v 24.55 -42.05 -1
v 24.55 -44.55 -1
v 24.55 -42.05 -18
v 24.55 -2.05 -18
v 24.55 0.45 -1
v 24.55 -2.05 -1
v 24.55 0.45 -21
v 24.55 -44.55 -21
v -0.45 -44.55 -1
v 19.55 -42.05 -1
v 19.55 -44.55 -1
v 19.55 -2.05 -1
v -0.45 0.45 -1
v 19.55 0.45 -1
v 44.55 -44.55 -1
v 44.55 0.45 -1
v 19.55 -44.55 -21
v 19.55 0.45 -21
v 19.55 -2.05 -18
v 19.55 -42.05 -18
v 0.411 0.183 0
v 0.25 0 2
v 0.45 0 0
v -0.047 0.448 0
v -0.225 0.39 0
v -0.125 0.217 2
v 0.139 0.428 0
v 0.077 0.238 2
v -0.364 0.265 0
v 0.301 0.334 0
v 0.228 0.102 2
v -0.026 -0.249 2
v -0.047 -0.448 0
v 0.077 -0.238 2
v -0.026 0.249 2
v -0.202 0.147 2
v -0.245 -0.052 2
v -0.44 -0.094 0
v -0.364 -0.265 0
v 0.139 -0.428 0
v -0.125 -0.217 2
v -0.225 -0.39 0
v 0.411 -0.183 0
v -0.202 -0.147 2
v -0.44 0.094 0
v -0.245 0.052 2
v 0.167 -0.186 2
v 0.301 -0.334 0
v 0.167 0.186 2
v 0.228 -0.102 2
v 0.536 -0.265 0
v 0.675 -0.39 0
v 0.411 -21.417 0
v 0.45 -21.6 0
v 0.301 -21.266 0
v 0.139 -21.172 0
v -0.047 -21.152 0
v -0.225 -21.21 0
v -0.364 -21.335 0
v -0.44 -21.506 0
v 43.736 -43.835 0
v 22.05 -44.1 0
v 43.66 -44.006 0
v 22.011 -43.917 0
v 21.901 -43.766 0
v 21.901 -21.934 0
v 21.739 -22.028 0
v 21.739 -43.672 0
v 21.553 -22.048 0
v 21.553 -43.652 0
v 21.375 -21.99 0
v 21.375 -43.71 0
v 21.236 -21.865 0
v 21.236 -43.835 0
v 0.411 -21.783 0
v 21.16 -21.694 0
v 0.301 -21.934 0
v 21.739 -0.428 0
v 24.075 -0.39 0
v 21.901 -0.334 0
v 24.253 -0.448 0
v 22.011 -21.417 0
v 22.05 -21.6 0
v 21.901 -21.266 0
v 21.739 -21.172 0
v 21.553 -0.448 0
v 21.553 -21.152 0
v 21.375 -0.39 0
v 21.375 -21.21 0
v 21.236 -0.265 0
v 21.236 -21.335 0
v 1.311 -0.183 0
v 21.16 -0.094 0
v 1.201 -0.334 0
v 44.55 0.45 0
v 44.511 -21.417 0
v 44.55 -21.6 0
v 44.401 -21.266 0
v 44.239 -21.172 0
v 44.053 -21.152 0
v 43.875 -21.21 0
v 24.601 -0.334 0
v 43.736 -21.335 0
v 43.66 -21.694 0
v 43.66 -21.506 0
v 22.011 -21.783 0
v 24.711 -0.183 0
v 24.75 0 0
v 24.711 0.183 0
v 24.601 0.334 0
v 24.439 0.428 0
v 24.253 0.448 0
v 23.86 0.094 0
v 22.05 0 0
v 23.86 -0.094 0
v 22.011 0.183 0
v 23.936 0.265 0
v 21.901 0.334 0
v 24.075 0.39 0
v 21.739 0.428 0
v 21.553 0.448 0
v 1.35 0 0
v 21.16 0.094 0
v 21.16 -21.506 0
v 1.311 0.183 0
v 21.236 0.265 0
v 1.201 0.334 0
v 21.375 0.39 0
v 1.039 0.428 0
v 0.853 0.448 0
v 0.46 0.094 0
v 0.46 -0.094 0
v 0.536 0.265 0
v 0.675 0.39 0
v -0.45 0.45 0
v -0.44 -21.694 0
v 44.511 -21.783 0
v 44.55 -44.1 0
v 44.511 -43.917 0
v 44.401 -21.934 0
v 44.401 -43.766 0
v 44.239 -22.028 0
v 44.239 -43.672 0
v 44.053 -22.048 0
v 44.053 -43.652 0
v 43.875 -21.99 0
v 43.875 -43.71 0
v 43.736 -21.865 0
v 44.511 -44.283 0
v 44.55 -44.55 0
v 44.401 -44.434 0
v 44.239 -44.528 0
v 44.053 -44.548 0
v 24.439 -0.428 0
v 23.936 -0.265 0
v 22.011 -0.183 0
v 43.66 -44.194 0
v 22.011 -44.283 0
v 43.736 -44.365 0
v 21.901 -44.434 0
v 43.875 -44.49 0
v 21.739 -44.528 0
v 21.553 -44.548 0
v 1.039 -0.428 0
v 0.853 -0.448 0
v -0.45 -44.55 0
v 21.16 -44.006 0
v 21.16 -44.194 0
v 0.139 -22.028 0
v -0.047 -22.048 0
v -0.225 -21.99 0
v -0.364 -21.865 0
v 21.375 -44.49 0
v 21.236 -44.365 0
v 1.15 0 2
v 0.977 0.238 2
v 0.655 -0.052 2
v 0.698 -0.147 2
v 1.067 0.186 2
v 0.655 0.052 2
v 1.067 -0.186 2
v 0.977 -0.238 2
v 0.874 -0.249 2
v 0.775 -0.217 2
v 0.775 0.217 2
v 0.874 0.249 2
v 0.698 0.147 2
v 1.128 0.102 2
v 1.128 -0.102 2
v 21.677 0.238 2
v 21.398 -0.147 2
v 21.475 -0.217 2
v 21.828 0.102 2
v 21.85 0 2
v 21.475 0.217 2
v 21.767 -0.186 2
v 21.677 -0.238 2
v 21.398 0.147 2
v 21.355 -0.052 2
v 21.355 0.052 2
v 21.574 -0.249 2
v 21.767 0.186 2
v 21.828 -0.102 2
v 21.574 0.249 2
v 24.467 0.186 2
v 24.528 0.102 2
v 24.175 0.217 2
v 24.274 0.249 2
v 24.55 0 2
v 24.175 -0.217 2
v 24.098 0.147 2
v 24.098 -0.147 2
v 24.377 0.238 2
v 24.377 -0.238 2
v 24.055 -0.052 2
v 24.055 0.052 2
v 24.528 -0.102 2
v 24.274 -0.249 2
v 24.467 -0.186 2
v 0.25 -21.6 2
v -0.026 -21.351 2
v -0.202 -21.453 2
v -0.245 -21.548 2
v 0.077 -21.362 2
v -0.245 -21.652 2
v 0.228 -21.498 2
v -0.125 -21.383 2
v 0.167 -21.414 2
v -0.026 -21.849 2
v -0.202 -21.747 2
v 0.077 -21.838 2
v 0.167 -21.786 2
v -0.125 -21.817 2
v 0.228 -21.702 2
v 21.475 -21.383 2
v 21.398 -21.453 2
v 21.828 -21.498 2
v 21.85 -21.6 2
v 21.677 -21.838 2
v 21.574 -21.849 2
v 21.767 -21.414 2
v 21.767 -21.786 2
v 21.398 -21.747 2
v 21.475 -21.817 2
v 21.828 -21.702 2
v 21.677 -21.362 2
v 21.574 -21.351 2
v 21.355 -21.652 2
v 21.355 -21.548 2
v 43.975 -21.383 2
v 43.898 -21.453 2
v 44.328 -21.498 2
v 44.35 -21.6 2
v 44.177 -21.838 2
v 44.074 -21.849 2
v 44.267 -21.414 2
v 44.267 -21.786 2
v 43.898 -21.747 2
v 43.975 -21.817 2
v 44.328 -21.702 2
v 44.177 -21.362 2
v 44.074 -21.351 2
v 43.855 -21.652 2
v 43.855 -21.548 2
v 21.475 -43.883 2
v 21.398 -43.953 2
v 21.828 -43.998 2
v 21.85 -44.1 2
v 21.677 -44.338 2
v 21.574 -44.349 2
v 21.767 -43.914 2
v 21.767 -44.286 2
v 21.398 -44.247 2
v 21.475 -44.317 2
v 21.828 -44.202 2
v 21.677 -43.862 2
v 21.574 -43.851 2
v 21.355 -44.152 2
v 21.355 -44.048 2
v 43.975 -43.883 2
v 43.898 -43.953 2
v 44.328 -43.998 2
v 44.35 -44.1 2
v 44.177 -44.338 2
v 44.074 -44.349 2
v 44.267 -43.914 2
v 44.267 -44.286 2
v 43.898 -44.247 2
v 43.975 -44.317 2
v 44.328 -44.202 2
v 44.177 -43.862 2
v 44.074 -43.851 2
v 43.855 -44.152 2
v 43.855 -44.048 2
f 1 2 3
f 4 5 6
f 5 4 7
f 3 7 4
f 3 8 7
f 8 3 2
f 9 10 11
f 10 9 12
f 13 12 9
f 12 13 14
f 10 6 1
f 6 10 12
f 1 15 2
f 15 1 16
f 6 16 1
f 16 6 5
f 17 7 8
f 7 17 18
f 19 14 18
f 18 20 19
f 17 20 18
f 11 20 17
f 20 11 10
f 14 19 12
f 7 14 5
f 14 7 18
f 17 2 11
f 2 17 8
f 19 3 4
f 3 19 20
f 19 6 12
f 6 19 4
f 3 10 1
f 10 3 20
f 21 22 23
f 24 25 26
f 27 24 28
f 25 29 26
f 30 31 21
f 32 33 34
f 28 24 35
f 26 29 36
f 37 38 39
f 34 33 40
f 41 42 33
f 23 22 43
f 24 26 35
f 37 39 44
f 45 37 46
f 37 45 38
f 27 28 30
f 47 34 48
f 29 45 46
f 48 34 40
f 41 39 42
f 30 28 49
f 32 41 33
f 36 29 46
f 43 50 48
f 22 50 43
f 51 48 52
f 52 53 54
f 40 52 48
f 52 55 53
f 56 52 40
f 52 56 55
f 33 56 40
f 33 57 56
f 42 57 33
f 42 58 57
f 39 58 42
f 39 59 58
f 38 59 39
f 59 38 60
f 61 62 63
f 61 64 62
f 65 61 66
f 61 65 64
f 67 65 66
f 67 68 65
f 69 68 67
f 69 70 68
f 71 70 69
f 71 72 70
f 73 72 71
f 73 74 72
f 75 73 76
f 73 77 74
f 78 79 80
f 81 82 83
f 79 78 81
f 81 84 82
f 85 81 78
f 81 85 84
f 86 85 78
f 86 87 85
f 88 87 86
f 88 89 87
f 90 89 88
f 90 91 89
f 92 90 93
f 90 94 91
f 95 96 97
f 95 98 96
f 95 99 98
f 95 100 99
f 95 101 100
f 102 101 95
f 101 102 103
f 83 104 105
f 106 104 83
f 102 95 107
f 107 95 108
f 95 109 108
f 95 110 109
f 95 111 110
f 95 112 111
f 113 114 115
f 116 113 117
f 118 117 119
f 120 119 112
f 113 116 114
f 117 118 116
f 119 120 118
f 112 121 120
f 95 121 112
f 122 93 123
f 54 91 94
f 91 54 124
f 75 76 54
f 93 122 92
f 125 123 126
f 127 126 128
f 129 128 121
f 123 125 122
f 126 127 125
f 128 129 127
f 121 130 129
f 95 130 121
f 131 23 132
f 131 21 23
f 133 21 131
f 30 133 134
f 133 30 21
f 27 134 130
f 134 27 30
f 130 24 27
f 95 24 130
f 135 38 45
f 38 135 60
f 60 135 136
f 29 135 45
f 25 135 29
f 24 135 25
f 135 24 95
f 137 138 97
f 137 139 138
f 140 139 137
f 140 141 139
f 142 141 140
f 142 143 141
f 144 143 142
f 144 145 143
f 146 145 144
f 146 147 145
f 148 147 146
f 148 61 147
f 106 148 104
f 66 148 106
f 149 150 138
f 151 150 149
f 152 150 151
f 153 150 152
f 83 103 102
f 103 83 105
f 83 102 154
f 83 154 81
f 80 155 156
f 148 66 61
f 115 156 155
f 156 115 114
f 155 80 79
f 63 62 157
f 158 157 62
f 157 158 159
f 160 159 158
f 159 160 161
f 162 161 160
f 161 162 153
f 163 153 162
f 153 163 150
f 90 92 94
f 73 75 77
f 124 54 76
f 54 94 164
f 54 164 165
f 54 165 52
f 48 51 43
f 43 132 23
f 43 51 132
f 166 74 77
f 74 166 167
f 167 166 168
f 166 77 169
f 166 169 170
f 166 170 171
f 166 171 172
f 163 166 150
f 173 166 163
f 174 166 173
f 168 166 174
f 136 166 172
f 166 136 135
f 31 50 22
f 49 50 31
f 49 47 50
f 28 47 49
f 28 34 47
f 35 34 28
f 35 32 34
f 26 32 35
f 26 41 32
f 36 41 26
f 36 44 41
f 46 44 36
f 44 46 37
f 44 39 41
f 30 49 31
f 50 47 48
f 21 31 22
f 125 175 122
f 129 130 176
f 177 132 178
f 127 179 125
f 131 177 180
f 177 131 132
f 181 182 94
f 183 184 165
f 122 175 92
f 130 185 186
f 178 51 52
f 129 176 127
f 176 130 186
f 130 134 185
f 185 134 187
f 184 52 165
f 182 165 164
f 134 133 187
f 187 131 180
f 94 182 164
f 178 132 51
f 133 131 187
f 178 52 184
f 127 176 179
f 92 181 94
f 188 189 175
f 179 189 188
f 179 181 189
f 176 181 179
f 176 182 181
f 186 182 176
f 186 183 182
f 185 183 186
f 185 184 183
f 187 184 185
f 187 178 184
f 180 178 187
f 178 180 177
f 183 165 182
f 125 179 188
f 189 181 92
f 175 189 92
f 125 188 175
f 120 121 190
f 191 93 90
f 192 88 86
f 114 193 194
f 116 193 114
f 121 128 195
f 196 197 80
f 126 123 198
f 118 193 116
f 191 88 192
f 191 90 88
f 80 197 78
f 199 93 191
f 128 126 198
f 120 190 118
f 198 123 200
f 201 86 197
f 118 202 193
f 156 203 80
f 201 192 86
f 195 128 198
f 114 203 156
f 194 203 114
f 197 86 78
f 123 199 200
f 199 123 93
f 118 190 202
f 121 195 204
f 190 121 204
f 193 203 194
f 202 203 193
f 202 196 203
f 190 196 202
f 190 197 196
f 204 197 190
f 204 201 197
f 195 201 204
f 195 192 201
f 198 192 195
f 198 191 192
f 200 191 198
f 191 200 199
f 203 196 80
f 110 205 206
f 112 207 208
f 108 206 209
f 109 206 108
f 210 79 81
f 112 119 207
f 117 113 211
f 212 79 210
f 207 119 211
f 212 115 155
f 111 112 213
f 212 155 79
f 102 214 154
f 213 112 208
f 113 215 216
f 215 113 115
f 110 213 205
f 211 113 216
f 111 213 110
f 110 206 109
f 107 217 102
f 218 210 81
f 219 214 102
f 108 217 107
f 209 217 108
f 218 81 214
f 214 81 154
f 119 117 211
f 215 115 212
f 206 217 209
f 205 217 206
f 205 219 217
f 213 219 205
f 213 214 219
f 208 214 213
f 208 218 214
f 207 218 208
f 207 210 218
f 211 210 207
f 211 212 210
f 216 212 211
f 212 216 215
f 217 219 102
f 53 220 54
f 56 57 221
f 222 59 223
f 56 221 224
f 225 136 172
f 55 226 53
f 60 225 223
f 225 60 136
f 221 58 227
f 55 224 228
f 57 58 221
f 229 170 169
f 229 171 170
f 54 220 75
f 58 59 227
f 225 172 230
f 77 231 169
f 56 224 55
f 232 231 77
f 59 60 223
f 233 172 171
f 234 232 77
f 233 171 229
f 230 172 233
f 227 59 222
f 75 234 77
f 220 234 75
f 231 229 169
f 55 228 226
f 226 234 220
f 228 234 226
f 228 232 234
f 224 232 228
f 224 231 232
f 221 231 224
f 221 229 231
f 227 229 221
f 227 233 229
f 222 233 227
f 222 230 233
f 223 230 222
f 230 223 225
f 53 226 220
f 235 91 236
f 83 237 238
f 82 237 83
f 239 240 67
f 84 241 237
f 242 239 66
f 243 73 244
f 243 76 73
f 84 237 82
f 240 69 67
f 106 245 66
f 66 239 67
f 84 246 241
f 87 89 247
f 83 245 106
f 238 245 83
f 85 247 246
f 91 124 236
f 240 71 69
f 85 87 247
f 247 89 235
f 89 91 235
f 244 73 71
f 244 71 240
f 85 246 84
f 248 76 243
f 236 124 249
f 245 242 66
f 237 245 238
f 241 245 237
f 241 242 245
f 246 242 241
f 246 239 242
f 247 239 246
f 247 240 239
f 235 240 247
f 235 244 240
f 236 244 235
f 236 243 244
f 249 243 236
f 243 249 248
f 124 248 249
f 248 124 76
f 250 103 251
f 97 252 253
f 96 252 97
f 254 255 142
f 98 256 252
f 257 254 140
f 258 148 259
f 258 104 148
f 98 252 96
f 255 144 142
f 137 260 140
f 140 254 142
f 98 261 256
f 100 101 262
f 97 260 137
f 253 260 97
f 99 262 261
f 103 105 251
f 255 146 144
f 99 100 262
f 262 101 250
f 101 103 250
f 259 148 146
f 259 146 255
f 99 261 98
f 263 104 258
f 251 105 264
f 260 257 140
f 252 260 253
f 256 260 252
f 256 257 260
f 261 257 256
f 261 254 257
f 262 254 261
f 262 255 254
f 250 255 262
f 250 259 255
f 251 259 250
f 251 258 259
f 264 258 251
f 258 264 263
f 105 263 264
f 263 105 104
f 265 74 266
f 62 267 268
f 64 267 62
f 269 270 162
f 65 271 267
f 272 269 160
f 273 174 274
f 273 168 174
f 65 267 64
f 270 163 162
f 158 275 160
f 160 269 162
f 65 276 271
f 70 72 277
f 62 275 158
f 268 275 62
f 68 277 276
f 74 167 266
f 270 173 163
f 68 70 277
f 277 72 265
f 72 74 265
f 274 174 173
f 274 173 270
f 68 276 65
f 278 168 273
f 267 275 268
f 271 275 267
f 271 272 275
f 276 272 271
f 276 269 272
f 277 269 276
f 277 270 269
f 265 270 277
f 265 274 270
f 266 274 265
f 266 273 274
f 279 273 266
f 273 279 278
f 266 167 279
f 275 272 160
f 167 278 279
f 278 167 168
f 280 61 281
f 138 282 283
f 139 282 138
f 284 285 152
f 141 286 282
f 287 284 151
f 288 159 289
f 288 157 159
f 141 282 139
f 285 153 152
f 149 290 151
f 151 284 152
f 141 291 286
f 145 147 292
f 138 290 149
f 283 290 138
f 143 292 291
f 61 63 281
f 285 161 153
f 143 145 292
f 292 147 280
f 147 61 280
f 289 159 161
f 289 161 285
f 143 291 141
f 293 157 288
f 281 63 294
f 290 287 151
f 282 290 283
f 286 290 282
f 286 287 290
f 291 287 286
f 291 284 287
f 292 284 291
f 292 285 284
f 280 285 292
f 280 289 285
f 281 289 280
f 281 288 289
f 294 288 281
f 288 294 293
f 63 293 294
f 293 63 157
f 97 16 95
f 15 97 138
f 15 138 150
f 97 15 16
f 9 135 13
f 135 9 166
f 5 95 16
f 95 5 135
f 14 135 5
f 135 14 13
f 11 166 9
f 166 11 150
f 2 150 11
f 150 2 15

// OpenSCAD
$fn=15;
gridLength = 45;
gridSquares = 50;
oneGridLength = gridLength / gridSquares;
platformThickness = 1;
handleThickness = 5;
handleHeight = 20;

module buildPlatform(){
  translate([22.05,-22.05, -0.5 * platformThickness])
  cube([45,45,platformThickness], center = true);  
    
}

module buildHandle(){
    translate([22.05,-22.05,-0.5 * handleHeight - platformThickness])
    difference(){
        cube([handleThickness, 45, handleHeight], center = true);
        translate([0,0,4])
        cube([handleThickness + 1, 40, 22], center = true);
    }
    
}   

module buildStamp(array){
  buildPlatform();
  buildHandle();
  
  for ( row=[0:1:gridSquares - 1]) {
    for ( col=[0:1:gridSquares - 1]) {
      if(array[row][col] == 1){
        translate([col * oneGridLength,row * -1 * oneGridLength,0])
        cylinder(h=2,d1=oneGridLength, d2 = 0.5);
      }   
    }
  }
  
    
}

buildStamp(sender_array);

sender_array = [[1, 1, 0, 0, 0, 0, 0, 0, 0, 0, 0, 0, 0, 0, 0, 0, 0, 0, 0, 0, 0, 0, 0, 0, 1, 0, 0, 1, 0, 0, 0, 0, 0, 0, 0, 0, 0, 0, 0, 0, 0, 0, 0, 0, 0, 0, 0, 0, 0, 0], [0, 0, 0, 0, 0, 0, 0, 0, 0, 0, 0, 0, 0, 0, 0, 0, 0, 0, 0, 0, 0, 0, 0, 0, 0, 0, 0, 0, 0, 0, 0, 0, 0, 0, 0, 0, 0, 0, 0, 0, 0, 0, 0, 0, 0, 0, 0, 0, 0, 0], [0, 0, 0, 0, 0, 0, 0, 0, 0, 0, 0, 0, 0, 0, 0, 0, 0, 0, 0, 0, 0, 0, 0, 0, 0, 0, 0, 0, 0, 0, 0, 0, 0, 0, 0, 0, 0, 0, 0, 0, 0, 0, 0, 0, 0, 0, 0, 0, 0, 0], [0, 0, 0, 0, 0, 0, 0, 0, 0, 0, 0, 0, 0, 0, 0, 0, 0, 0, 0, 0, 0, 0, 0, 0, 0, 0, 0, 0, 0, 0, 0, 0, 0, 0, 0, 0, 0, 0, 0, 0, 0, 0, 0, 0, 0, 0, 0, 0, 0, 0], [0, 0, 0, 0, 0, 0, 0, 0, 0, 0, 0, 0, 0, 0, 0, 0, 0, 0, 0, 0, 0, 0, 0, 0, 0, 0, 0, 0, 0, 0, 0, 0, 0, 0, 0, 0, 0, 0, 0, 0, 0, 0, 0, 0, 0, 0, 0, 0, 0, 0], [0, 0, 0, 0, 0, 0, 0, 0, 0, 0, 0, 0, 0, 0, 0, 0, 0, 0, 0, 0, 0, 0, 0, 0, 0, 0, 0, 0, 0, 0, 0, 0, 0, 0, 0, 0, 0, 0, 0, 0, 0, 0, 0, 0, 0, 0, 0, 0, 0, 0], [0, 0, 0, 0, 0, 0, 0, 0, 0, 0, 0, 0, 0, 0, 0, 0, 0, 0, 0, 0, 0, 0, 0, 0, 0, 0, 0, 0, 0, 0, 0, 0, 0, 0, 0, 0, 0, 0, 0, 0, 0, 0, 0, 0, 0, 0, 0, 0, 0, 0], [0, 0, 0, 0, 0, 0, 0, 0, 0, 0, 0, 0, 0, 0, 0, 0, 0, 0, 0, 0, 0, 0, 0, 0, 0, 0, 0, 0, 0, 0, 0, 0, 0, 0, 0, 0, 0, 0, 0, 0, 0, 0, 0, 0, 0, 0, 0, 0, 0, 0], [0, 0, 0, 0, 0, 0, 0, 0, 0, 0, 0, 0, 0, 0, 0, 0, 0, 0, 0, 0, 0, 0, 0, 0, 0, 0, 0, 0, 0, 0, 0, 0, 0, 0, 0, 0, 0, 0, 0, 0, 0, 0, 0, 0, 0, 0, 0, 0, 0, 0], [0, 0, 0, 0, 0, 0, 0, 0, 0, 0, 0, 0, 0, 0, 0, 0, 0, 0, 0, 0, 0, 0, 0, 0, 0, 0, 0, 0, 0, 0, 0, 0, 0, 0, 0, 0, 0, 0, 0, 0, 0, 0, 0, 0, 0, 0, 0, 0, 0, 0], [0, 0, 0, 0, 0, 0, 0, 0, 0, 0, 0, 0, 0, 0, 0, 0, 0, 0, 0, 0, 0, 0, 0, 0, 0, 0, 0, 0, 0, 0, 0, 0, 0, 0, 0, 0, 0, 0, 0, 0, 0, 0, 0, 0, 0, 0, 0, 0, 0, 0], [0, 0, 0, 0, 0, 0, 0, 0, 0, 0, 0, 0, 0, 0, 0, 0, 0, 0, 0, 0, 0, 0, 0, 0, 0, 0, 0, 0, 0, 0, 0, 0, 0, 0, 0, 0, 0, 0, 0, 0, 0, 0, 0, 0, 0, 0, 0, 0, 0, 0], [0, 0, 0, 0, 0, 0, 0, 0, 0, 0, 0, 0, 0, 0, 0, 0, 0, 0, 0, 0, 0, 0, 0, 0, 0, 0, 0, 0, 0, 0, 0, 0, 0, 0, 0, 0, 0, 0, 0, 0, 0, 0, 0, 0, 0, 0, 0, 0, 0, 0], [0, 0, 0, 0, 0, 0, 0, 0, 0, 0, 0, 0, 0, 0, 0, 0, 0, 0, 0, 0, 0, 0, 0, 0, 0, 0, 0, 0, 0, 0, 0, 0, 0, 0, 0, 0, 0, 0, 0, 0, 0, 0, 0, 0, 0, 0, 0, 0, 0, 0], [0, 0, 0, 0, 0, 0, 0, 0, 0, 0, 0, 0, 0, 0, 0, 0, 0, 0, 0, 0, 0, 0, 0, 0, 0, 0, 0, 0, 0, 0, 0, 0, 0, 0, 0, 0, 0, 0, 0, 0, 0, 0, 0, 0, 0, 0, 0, 0, 0, 0], [0, 0, 0, 0, 0, 0, 0, 0, 0, 0, 0, 0, 0, 0, 0, 0, 0, 0, 0, 0, 0, 0, 0, 0, 0, 0, 0, 0, 0, 0, 0, 0, 0, 0, 0, 0, 0, 0, 0, 0, 0, 0, 0, 0, 0, 0, 0, 0, 0, 0], [0, 0, 0, 0, 0, 0, 0, 0, 0, 0, 0, 0, 0, 0, 0, 0, 0, 0, 0, 0, 0, 0, 0, 0, 0, 0, 0, 0, 0, 0, 0, 0, 0, 0, 0, 0, 0, 0, 0, 0, 0, 0, 0, 0, 0, 0, 0, 0, 0, 0], [0, 0, 0, 0, 0, 0, 0, 0, 0, 0, 0, 0, 0, 0, 0, 0, 0, 0, 0, 0, 0, 0, 0, 0, 0, 0, 0, 0, 0, 0, 0, 0, 0, 0, 0, 0, 0, 0, 0, 0, 0, 0, 0, 0, 0, 0, 0, 0, 0, 0], [0, 0, 0, 0, 0, 0, 0, 0, 0, 0, 0, 0, 0, 0, 0, 0, 0, 0, 0, 0, 0, 0, 0, 0, 0, 0, 0, 0, 0, 0, 0, 0, 0, 0, 0, 0, 0, 0, 0, 0, 0, 0, 0, 0, 0, 0, 0, 0, 0, 0], [0, 0, 0, 0, 0, 0, 0, 0, 0, 0, 0, 0, 0, 0, 0, 0, 0, 0, 0, 0, 0, 0, 0, 0, 0, 0, 0, 0, 0, 0, 0, 0, 0, 0, 0, 0, 0, 0, 0, 0, 0, 0, 0, 0, 0, 0, 0, 0, 0, 0], [0, 0, 0, 0, 0, 0, 0, 0, 0, 0, 0, 0, 0, 0, 0, 0, 0, 0, 0, 0, 0, 0, 0, 0, 0, 0, 0, 0, 0, 0, 0, 0, 0, 0, 0, 0, 0, 0, 0, 0, 0, 0, 0, 0, 0, 0, 0, 0, 0, 0], [0, 0, 0, 0, 0, 0, 0, 0, 0, 0, 0, 0, 0, 0, 0, 0, 0, 0, 0, 0, 0, 0, 0, 0, 0, 0, 0, 0, 0, 0, 0, 0, 0, 0, 0, 0, 0, 0, 0, 0, 0, 0, 0, 0, 0, 0, 0, 0, 0, 0], [0, 0, 0, 0, 0, 0, 0, 0, 0, 0, 0, 0, 0, 0, 0, 0, 0, 0, 0, 0, 0, 0, 0, 0, 0, 0, 0, 0, 0, 0, 0, 0, 0, 0, 0, 0, 0, 0, 0, 0, 0, 0, 0, 0, 0, 0, 0, 0, 0, 0], [0, 0, 0, 0, 0, 0, 0, 0, 0, 0, 0, 0, 0, 0, 0, 0, 0, 0, 0, 0, 0, 0, 0, 0, 0, 0, 0, 0, 0, 0, 0, 0, 0, 0, 0, 0, 0, 0, 0, 0, 0, 0, 0, 0, 0, 0, 0, 0, 0, 0], [1, 0, 0, 0, 0, 0, 0, 0, 0, 0, 0, 0, 0, 0, 0, 0, 0, 0, 0, 0, 0, 0, 0, 0, 1, 0, 0, 0, 0, 0, 0, 0, 0, 0, 0, 0, 0, 0, 0, 0, 0, 0, 0, 0, 0, 0, 0, 0, 0, 1], [0, 0, 0, 0, 0, 0, 0, 0, 0, 0, 0, 0, 0, 0, 0, 0, 0, 0, 0, 0, 0, 0, 0, 0, 0, 0, 0, 0, 0, 0, 0, 0, 0, 0, 0, 0, 0, 0, 0, 0, 0, 0, 0, 0, 0, 0, 0, 0, 0, 0], [0, 0, 0, 0, 0, 0, 0, 0, 0, 0, 0, 0, 0, 0, 0, 0, 0, 0, 0, 0, 0, 0, 0, 0, 0, 0, 0, 0, 0, 0, 0, 0, 0, 0, 0, 0, 0, 0, 0, 0, 0, 0, 0, 0, 0, 0, 0, 0, 0, 0], [0, 0, 0, 0, 0, 0, 0, 0, 0, 0, 0, 0, 0, 0, 0, 0, 0, 0, 0, 0, 0, 0, 0, 0, 0, 0, 0, 0, 0, 0, 0, 0, 0, 0, 0, 0, 0, 0, 0, 0, 0, 0, 0, 0, 0, 0, 0, 0, 0, 0], [0, 0, 0, 0, 0, 0, 0, 0, 0, 0, 0, 0, 0, 0, 0, 0, 0, 0, 0, 0, 0, 0, 0, 0, 0, 0, 0, 0, 0, 0, 0, 0, 0, 0, 0, 0, 0, 0, 0, 0, 0, 0, 0, 0, 0, 0, 0, 0, 0, 0], [0, 0, 0, 0, 0, 0, 0, 0, 0, 0, 0, 0, 0, 0, 0, 0, 0, 0, 0, 0, 0, 0, 0, 0, 0, 0, 0, 0, 0, 0, 0, 0, 0, 0, 0, 0, 0, 0, 0, 0, 0, 0, 0, 0, 0, 0, 0, 0, 0, 0], [0, 0, 0, 0, 0, 0, 0, 0, 0, 0, 0, 0, 0, 0, 0, 0, 0, 0, 0, 0, 0, 0, 0, 0, 0, 0, 0, 0, 0, 0, 0, 0, 0, 0, 0, 0, 0, 0, 0, 0, 0, 0, 0, 0, 0, 0, 0, 0, 0, 0], [0, 0, 0, 0, 0, 0, 0, 0, 0, 0, 0, 0, 0, 0, 0, 0, 0, 0, 0, 0, 0, 0, 0, 0, 0, 0, 0, 0, 0, 0, 0, 0, 0, 0, 0, 0, 0, 0, 0, 0, 0, 0, 0, 0, 0, 0, 0, 0, 0, 0], [0, 0, 0, 0, 0, 0, 0, 0, 0, 0, 0, 0, 0, 0, 0, 0, 0, 0, 0, 0, 0, 0, 0, 0, 0, 0, 0, 0, 0, 0, 0, 0, 0, 0, 0, 0, 0, 0, 0, 0, 0, 0, 0, 0, 0, 0, 0, 0, 0, 0], [0, 0, 0, 0, 0, 0, 0, 0, 0, 0, 0, 0, 0, 0, 0, 0, 0, 0, 0, 0, 0, 0, 0, 0, 0, 0, 0, 0, 0, 0, 0, 0, 0, 0, 0, 0, 0, 0, 0, 0, 0, 0, 0, 0, 0, 0, 0, 0, 0, 0], [0, 0, 0, 0, 0, 0, 0, 0, 0, 0, 0, 0, 0, 0, 0, 0, 0, 0, 0, 0, 0, 0, 0, 0, 0, 0, 0, 0, 0, 0, 0, 0, 0, 0, 0, 0, 0, 0, 0, 0, 0, 0, 0, 0, 0, 0, 0, 0, 0, 0], [0, 0, 0, 0, 0, 0, 0, 0, 0, 0, 0, 0, 0, 0, 0, 0, 0, 0, 0, 0, 0, 0, 0, 0, 0, 0, 0, 0, 0, 0, 0, 0, 0, 0, 0, 0, 0, 0, 0, 0, 0, 0, 0, 0, 0, 0, 0, 0, 0, 0], [0, 0, 0, 0, 0, 0, 0, 0, 0, 0, 0, 0, 0, 0, 0, 0, 0, 0, 0, 0, 0, 0, 0, 0, 0, 0, 0, 0, 0, 0, 0, 0, 0, 0, 0, 0, 0, 0, 0, 0, 0, 0, 0, 0, 0, 0, 0, 0, 0, 0], [0, 0, 0, 0, 0, 0, 0, 0, 0, 0, 0, 0, 0, 0, 0, 0, 0, 0, 0, 0, 0, 0, 0, 0, 0, 0, 0, 0, 0, 0, 0, 0, 0, 0, 0, 0, 0, 0, 0, 0, 0, 0, 0, 0, 0, 0, 0, 0, 0, 0], [0, 0, 0, 0, 0, 0, 0, 0, 0, 0, 0, 0, 0, 0, 0, 0, 0, 0, 0, 0, 0, 0, 0, 0, 0, 0, 0, 0, 0, 0, 0, 0, 0, 0, 0, 0, 0, 0, 0, 0, 0, 0, 0, 0, 0, 0, 0, 0, 0, 0], [0, 0, 0, 0, 0, 0, 0, 0, 0, 0, 0, 0, 0, 0, 0, 0, 0, 0, 0, 0, 0, 0, 0, 0, 0, 0, 0, 0, 0, 0, 0, 0, 0, 0, 0, 0, 0, 0, 0, 0, 0, 0, 0, 0, 0, 0, 0, 0, 0, 0], [0, 0, 0, 0, 0, 0, 0, 0, 0, 0, 0, 0, 0, 0, 0, 0, 0, 0, 0, 0, 0, 0, 0, 0, 0, 0, 0, 0, 0, 0, 0, 0, 0, 0, 0, 0, 0, 0, 0, 0, 0, 0, 0, 0, 0, 0, 0, 0, 0, 0], [0, 0, 0, 0, 0, 0, 0, 0, 0, 0, 0, 0, 0, 0, 0, 0, 0, 0, 0, 0, 0, 0, 0, 0, 0, 0, 0, 0, 0, 0, 0, 0, 0, 0, 0, 0, 0, 0, 0, 0, 0, 0, 0, 0, 0, 0, 0, 0, 0, 0], [0, 0, 0, 0, 0, 0, 0, 0, 0, 0, 0, 0, 0, 0, 0, 0, 0, 0, 0, 0, 0, 0, 0, 0, 0, 0, 0, 0, 0, 0, 0, 0, 0, 0, 0, 0, 0, 0, 0, 0, 0, 0, 0, 0, 0, 0, 0, 0, 0, 0], [0, 0, 0, 0, 0, 0, 0, 0, 0, 0, 0, 0, 0, 0, 0, 0, 0, 0, 0, 0, 0, 0, 0, 0, 0, 0, 0, 0, 0, 0, 0, 0, 0, 0, 0, 0, 0, 0, 0, 0, 0, 0, 0, 0, 0, 0, 0, 0, 0, 0], [0, 0, 0, 0, 0, 0, 0, 0, 0, 0, 0, 0, 0, 0, 0, 0, 0, 0, 0, 0, 0, 0, 0, 0, 0, 0, 0, 0, 0, 0, 0, 0, 0, 0, 0, 0, 0, 0, 0, 0, 0, 0, 0, 0, 0, 0, 0, 0, 0, 0], [0, 0, 0, 0, 0, 0, 0, 0, 0, 0, 0, 0, 0, 0, 0, 0, 0, 0, 0, 0, 0, 0, 0, 0, 0, 0, 0, 0, 0, 0, 0, 0, 0, 0, 0, 0, 0, 0, 0, 0, 0, 0, 0, 0, 0, 0, 0, 0, 0, 0], [0, 0, 0, 0, 0, 0, 0, 0, 0, 0, 0, 0, 0, 0, 0, 0, 0, 0, 0, 0, 0, 0, 0, 0, 0, 0, 0, 0, 0, 0, 0, 0, 0, 0, 0, 0, 0, 0, 0, 0, 0, 0, 0, 0, 0, 0, 0, 0, 0, 0], [0, 0, 0, 0, 0, 0, 0, 0, 0, 0, 0, 0, 0, 0, 0, 0, 0, 0, 0, 0, 0, 0, 0, 0, 0, 0, 0, 0, 0, 0, 0, 0, 0, 0, 0, 0, 0, 0, 0, 0, 0, 0, 0, 0, 0, 0, 0, 0, 0, 0], [0, 0, 0, 0, 0, 0, 0, 0, 0, 0, 0, 0, 0, 0, 0, 0, 0, 0, 0, 0, 0, 0, 0, 0, 0, 0, 0, 0, 0, 0, 0, 0, 0, 0, 0, 0, 0, 0, 0, 0, 0, 0, 0, 0, 0, 0, 0, 0, 0, 0], [0, 0, 0, 0, 0, 0, 0, 0, 0, 0, 0, 0, 0, 0, 0, 0, 0, 0, 0, 0, 0, 0, 0, 0, 1, 0, 0, 0, 0, 0, 0, 0, 0, 0, 0, 0, 0, 0, 0, 0, 0, 0, 0, 0, 0, 0, 0, 0, 0, 1]] ;
